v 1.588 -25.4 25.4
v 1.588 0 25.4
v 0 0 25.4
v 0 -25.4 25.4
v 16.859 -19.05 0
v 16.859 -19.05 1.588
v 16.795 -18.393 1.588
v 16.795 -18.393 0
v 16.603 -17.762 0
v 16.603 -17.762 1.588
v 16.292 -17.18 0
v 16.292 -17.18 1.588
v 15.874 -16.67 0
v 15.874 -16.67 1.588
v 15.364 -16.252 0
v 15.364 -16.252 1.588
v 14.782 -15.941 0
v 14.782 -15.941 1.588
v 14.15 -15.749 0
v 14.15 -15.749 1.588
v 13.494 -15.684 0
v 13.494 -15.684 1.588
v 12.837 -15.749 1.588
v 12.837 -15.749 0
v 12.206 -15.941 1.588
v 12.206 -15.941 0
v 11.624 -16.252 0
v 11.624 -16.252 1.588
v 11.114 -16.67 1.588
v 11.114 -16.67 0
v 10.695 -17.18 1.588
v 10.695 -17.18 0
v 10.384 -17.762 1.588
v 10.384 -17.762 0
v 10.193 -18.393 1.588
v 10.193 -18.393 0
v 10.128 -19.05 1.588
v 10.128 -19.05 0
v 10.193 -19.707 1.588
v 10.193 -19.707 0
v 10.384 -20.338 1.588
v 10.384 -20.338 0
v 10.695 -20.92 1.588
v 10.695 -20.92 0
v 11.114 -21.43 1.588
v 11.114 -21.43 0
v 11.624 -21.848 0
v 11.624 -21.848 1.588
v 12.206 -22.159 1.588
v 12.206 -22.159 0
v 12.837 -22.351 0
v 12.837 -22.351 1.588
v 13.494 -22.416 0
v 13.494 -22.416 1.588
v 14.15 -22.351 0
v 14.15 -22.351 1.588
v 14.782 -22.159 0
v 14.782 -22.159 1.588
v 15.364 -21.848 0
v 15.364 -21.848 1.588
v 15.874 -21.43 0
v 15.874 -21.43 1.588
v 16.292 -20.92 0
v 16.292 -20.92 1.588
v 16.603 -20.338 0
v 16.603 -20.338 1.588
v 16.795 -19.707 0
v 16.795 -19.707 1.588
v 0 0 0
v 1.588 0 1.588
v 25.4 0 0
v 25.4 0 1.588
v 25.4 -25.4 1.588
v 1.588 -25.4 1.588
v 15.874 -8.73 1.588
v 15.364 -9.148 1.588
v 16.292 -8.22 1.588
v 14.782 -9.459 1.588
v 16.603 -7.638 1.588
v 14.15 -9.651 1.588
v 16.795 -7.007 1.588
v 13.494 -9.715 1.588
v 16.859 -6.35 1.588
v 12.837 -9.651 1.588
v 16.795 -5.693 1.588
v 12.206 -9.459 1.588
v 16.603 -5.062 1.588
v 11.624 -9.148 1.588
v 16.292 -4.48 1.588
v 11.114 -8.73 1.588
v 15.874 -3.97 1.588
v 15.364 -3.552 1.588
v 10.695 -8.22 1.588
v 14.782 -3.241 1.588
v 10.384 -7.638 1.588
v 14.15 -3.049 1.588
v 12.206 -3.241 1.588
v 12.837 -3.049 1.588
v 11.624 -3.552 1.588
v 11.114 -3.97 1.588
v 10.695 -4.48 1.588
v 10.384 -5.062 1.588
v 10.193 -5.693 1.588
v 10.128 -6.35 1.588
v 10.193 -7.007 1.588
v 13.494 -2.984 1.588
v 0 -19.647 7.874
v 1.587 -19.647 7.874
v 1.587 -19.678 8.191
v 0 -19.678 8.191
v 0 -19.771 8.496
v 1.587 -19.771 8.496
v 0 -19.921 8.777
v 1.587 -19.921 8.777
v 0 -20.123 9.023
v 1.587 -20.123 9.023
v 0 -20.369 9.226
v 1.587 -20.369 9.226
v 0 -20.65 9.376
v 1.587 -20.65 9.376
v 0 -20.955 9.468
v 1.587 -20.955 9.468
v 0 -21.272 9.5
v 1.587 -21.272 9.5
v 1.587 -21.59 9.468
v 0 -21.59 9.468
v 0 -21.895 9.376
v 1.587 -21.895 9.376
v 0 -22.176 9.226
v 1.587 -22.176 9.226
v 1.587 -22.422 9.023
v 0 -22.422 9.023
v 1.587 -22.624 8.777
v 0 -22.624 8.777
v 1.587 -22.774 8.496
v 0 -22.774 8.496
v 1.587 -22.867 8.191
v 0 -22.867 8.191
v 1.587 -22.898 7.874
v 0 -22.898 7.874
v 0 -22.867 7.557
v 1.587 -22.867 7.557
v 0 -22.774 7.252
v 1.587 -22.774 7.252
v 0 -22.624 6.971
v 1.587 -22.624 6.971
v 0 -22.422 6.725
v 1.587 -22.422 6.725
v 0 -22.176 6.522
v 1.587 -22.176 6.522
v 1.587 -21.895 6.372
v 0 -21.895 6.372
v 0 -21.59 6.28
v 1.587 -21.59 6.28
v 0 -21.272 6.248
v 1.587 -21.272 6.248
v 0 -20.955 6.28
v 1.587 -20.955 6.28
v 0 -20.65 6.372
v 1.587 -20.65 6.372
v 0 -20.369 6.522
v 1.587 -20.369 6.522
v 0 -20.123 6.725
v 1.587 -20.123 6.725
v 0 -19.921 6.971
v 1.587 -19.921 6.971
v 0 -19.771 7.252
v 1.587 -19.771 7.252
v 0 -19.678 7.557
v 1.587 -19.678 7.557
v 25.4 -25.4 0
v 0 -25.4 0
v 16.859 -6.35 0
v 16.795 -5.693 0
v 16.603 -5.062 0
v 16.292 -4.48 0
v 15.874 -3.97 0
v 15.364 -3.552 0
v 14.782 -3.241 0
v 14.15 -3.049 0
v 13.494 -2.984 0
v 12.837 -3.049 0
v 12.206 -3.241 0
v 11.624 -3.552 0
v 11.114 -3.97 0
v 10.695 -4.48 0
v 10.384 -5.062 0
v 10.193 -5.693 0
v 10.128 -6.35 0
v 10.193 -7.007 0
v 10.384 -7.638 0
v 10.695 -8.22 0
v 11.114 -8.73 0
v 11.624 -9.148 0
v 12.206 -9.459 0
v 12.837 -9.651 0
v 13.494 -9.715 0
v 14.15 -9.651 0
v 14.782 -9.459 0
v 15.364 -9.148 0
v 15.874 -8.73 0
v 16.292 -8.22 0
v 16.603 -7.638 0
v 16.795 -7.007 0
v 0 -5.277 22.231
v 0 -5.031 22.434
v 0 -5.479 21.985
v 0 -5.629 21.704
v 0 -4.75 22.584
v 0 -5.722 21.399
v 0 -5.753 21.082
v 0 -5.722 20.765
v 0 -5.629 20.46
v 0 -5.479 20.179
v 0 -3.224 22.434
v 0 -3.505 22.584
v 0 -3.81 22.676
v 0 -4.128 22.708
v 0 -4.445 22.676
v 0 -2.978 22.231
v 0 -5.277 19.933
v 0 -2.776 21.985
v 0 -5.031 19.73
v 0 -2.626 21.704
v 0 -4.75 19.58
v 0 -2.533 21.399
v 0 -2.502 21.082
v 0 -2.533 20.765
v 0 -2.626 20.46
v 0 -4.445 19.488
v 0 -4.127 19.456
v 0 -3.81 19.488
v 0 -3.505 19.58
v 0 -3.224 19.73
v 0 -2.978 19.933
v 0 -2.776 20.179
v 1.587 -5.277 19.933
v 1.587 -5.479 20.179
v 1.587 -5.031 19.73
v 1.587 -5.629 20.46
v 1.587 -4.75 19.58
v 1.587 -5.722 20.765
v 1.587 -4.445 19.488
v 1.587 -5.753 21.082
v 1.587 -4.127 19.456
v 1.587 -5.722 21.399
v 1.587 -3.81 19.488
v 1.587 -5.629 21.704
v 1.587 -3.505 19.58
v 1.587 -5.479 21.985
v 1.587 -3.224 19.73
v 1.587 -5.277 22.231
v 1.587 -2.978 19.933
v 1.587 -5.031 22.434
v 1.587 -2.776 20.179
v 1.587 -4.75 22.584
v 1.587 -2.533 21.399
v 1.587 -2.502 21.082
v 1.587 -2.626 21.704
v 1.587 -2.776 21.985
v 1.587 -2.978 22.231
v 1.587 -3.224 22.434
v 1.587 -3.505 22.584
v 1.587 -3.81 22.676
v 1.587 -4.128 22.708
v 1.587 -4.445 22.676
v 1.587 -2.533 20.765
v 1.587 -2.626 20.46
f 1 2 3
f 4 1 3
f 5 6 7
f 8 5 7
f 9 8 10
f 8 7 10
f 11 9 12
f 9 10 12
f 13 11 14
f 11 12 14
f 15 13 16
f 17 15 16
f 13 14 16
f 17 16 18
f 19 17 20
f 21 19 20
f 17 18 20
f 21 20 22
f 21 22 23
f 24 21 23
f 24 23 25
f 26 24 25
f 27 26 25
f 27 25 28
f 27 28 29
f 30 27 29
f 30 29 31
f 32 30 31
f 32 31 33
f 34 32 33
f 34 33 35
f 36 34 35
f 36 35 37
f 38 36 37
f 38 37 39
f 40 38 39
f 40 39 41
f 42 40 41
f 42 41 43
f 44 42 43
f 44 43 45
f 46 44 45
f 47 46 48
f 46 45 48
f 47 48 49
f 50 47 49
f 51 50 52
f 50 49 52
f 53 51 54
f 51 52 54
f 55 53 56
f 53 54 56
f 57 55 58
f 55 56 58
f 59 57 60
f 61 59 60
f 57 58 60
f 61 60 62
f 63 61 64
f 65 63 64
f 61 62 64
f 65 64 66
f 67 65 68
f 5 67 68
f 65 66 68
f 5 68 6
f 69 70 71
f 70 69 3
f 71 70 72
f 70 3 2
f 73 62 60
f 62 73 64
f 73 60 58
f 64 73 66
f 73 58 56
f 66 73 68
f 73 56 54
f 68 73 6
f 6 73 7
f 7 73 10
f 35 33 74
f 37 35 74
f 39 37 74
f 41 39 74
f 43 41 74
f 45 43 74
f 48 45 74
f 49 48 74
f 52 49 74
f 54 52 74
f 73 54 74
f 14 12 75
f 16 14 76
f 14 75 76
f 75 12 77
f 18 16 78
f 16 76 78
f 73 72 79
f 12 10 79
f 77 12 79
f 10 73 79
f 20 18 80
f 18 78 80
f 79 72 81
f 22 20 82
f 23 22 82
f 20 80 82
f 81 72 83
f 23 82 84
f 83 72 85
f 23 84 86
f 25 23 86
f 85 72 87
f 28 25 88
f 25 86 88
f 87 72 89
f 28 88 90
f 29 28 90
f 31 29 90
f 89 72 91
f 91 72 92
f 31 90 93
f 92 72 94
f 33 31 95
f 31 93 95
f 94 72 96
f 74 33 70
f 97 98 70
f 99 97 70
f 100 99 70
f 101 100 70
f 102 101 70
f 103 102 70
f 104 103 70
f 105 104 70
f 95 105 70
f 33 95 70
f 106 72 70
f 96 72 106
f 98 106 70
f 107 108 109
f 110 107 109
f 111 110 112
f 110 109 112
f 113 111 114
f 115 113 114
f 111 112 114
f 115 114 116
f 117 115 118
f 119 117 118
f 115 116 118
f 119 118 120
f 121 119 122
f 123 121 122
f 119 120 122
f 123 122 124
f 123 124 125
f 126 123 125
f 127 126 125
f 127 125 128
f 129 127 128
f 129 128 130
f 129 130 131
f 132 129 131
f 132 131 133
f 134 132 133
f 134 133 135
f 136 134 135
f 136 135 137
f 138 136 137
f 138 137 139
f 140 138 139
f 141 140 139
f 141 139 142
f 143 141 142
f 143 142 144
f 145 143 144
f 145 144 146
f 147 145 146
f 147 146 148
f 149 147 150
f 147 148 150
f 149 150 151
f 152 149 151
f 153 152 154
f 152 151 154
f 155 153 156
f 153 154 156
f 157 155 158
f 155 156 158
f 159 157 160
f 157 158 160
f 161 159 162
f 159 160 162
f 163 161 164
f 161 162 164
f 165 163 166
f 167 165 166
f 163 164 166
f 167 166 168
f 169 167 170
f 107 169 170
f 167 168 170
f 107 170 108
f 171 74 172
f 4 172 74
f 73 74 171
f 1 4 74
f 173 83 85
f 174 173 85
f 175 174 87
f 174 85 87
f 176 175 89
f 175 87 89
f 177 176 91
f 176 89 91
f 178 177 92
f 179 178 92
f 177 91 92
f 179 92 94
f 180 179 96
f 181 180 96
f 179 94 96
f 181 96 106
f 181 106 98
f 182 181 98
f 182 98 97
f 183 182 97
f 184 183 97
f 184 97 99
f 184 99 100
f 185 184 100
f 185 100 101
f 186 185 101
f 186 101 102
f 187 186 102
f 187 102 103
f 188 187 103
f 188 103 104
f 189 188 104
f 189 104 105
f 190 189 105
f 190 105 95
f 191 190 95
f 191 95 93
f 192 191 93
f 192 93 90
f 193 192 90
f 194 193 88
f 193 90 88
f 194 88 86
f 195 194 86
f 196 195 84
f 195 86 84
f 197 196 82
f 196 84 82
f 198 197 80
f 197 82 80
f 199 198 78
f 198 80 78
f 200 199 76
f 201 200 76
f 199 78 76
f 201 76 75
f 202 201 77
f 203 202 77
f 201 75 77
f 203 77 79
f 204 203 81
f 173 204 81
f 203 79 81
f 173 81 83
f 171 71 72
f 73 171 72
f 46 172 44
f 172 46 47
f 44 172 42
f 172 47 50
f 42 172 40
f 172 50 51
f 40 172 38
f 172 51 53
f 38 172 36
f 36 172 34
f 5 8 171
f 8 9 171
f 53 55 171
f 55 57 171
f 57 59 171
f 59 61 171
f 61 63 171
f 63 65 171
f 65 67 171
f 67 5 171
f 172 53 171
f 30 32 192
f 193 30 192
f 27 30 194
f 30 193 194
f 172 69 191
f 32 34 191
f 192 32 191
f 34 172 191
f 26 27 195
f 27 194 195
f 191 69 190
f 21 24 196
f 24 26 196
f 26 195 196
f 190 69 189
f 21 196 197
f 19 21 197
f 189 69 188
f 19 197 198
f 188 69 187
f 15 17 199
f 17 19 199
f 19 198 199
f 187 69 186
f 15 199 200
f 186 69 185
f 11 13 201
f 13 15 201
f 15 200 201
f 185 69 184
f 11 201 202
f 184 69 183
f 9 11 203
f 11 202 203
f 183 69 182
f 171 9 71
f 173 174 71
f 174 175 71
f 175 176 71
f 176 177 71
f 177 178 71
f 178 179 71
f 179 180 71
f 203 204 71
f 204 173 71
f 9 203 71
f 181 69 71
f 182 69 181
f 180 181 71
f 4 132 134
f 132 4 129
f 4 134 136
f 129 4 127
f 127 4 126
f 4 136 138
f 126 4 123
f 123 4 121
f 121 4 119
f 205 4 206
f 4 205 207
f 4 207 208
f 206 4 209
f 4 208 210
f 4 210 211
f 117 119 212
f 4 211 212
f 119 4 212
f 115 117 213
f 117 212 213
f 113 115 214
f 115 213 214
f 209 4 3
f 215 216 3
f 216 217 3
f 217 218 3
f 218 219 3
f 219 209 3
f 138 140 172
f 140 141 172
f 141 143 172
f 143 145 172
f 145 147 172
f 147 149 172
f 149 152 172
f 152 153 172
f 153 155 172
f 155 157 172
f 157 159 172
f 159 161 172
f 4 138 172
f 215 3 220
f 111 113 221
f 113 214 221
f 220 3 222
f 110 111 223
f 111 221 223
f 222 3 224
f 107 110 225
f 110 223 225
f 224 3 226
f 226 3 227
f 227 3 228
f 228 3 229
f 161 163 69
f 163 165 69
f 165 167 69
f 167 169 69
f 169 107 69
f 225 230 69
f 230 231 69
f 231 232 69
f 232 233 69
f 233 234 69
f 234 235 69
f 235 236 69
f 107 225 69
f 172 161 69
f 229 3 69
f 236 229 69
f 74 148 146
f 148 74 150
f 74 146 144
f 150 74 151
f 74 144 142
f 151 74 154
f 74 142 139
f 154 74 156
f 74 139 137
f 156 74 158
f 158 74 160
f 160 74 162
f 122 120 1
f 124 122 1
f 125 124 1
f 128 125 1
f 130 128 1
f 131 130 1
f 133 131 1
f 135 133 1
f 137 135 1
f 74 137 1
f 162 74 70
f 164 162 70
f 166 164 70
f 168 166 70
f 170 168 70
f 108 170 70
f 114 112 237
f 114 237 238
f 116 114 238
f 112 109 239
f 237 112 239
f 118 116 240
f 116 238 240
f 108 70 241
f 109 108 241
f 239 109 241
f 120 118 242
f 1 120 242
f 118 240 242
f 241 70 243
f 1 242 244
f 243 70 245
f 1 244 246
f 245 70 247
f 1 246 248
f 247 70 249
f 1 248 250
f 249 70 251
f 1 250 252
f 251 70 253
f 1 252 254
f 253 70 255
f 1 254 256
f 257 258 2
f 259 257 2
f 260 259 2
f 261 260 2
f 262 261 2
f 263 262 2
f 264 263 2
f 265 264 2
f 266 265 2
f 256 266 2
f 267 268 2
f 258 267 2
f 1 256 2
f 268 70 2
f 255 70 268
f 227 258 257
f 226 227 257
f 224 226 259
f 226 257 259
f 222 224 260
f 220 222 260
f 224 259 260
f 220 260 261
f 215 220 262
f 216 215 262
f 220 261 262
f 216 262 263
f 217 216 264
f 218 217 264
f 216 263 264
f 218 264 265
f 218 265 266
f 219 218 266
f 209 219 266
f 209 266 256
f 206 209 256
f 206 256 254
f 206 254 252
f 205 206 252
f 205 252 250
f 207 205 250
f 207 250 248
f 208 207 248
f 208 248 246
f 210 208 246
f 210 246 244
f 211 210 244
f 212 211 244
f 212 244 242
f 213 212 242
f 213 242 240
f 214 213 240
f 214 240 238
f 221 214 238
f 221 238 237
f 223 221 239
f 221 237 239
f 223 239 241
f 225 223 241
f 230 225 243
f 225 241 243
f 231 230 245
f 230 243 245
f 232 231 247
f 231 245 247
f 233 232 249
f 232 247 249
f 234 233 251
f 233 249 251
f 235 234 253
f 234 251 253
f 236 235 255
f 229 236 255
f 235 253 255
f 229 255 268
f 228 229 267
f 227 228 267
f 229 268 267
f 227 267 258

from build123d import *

# Parameters (mm, degrees)
F1_DEPTH = 25.4
F3_D     = 3.2512
F4_R     = 3.3655
F5_DEPTH = 25.4


with BuildPart() as f1:
    # F0 (on Front) → F1 (new body)
    with BuildSketch(Plane.XZ):
        Polygon((1.5875, 25.4), (0, 25.4), (0, 0), (25.4, 0), (25.4, 1.5875), (1.5875, 1.5875), align=None)
    extrude(amount=F1_DEPTH)

    # F3 (through all)
    with Locations(Plane(origin=(0, 0, 0), x_dir=(0, -1, 0), z_dir=(-1, 0, 0))):
        with Locations((4.1275, 21.082), (21.2725, 7.874)):
            Hole(F3_D / 2)

    # F4 (on face) → F5 (cut)
    with BuildSketch(Plane.XY.offset(1.5875)):
        with Locations((13.49375, -19.05)):
            Circle(F4_R)
        with Locations((13.49375, -6.35)):
            Circle(F4_R)
    extrude(amount=-F5_DEPTH, mode=Mode.SUBTRACT)


solid = f1.part
